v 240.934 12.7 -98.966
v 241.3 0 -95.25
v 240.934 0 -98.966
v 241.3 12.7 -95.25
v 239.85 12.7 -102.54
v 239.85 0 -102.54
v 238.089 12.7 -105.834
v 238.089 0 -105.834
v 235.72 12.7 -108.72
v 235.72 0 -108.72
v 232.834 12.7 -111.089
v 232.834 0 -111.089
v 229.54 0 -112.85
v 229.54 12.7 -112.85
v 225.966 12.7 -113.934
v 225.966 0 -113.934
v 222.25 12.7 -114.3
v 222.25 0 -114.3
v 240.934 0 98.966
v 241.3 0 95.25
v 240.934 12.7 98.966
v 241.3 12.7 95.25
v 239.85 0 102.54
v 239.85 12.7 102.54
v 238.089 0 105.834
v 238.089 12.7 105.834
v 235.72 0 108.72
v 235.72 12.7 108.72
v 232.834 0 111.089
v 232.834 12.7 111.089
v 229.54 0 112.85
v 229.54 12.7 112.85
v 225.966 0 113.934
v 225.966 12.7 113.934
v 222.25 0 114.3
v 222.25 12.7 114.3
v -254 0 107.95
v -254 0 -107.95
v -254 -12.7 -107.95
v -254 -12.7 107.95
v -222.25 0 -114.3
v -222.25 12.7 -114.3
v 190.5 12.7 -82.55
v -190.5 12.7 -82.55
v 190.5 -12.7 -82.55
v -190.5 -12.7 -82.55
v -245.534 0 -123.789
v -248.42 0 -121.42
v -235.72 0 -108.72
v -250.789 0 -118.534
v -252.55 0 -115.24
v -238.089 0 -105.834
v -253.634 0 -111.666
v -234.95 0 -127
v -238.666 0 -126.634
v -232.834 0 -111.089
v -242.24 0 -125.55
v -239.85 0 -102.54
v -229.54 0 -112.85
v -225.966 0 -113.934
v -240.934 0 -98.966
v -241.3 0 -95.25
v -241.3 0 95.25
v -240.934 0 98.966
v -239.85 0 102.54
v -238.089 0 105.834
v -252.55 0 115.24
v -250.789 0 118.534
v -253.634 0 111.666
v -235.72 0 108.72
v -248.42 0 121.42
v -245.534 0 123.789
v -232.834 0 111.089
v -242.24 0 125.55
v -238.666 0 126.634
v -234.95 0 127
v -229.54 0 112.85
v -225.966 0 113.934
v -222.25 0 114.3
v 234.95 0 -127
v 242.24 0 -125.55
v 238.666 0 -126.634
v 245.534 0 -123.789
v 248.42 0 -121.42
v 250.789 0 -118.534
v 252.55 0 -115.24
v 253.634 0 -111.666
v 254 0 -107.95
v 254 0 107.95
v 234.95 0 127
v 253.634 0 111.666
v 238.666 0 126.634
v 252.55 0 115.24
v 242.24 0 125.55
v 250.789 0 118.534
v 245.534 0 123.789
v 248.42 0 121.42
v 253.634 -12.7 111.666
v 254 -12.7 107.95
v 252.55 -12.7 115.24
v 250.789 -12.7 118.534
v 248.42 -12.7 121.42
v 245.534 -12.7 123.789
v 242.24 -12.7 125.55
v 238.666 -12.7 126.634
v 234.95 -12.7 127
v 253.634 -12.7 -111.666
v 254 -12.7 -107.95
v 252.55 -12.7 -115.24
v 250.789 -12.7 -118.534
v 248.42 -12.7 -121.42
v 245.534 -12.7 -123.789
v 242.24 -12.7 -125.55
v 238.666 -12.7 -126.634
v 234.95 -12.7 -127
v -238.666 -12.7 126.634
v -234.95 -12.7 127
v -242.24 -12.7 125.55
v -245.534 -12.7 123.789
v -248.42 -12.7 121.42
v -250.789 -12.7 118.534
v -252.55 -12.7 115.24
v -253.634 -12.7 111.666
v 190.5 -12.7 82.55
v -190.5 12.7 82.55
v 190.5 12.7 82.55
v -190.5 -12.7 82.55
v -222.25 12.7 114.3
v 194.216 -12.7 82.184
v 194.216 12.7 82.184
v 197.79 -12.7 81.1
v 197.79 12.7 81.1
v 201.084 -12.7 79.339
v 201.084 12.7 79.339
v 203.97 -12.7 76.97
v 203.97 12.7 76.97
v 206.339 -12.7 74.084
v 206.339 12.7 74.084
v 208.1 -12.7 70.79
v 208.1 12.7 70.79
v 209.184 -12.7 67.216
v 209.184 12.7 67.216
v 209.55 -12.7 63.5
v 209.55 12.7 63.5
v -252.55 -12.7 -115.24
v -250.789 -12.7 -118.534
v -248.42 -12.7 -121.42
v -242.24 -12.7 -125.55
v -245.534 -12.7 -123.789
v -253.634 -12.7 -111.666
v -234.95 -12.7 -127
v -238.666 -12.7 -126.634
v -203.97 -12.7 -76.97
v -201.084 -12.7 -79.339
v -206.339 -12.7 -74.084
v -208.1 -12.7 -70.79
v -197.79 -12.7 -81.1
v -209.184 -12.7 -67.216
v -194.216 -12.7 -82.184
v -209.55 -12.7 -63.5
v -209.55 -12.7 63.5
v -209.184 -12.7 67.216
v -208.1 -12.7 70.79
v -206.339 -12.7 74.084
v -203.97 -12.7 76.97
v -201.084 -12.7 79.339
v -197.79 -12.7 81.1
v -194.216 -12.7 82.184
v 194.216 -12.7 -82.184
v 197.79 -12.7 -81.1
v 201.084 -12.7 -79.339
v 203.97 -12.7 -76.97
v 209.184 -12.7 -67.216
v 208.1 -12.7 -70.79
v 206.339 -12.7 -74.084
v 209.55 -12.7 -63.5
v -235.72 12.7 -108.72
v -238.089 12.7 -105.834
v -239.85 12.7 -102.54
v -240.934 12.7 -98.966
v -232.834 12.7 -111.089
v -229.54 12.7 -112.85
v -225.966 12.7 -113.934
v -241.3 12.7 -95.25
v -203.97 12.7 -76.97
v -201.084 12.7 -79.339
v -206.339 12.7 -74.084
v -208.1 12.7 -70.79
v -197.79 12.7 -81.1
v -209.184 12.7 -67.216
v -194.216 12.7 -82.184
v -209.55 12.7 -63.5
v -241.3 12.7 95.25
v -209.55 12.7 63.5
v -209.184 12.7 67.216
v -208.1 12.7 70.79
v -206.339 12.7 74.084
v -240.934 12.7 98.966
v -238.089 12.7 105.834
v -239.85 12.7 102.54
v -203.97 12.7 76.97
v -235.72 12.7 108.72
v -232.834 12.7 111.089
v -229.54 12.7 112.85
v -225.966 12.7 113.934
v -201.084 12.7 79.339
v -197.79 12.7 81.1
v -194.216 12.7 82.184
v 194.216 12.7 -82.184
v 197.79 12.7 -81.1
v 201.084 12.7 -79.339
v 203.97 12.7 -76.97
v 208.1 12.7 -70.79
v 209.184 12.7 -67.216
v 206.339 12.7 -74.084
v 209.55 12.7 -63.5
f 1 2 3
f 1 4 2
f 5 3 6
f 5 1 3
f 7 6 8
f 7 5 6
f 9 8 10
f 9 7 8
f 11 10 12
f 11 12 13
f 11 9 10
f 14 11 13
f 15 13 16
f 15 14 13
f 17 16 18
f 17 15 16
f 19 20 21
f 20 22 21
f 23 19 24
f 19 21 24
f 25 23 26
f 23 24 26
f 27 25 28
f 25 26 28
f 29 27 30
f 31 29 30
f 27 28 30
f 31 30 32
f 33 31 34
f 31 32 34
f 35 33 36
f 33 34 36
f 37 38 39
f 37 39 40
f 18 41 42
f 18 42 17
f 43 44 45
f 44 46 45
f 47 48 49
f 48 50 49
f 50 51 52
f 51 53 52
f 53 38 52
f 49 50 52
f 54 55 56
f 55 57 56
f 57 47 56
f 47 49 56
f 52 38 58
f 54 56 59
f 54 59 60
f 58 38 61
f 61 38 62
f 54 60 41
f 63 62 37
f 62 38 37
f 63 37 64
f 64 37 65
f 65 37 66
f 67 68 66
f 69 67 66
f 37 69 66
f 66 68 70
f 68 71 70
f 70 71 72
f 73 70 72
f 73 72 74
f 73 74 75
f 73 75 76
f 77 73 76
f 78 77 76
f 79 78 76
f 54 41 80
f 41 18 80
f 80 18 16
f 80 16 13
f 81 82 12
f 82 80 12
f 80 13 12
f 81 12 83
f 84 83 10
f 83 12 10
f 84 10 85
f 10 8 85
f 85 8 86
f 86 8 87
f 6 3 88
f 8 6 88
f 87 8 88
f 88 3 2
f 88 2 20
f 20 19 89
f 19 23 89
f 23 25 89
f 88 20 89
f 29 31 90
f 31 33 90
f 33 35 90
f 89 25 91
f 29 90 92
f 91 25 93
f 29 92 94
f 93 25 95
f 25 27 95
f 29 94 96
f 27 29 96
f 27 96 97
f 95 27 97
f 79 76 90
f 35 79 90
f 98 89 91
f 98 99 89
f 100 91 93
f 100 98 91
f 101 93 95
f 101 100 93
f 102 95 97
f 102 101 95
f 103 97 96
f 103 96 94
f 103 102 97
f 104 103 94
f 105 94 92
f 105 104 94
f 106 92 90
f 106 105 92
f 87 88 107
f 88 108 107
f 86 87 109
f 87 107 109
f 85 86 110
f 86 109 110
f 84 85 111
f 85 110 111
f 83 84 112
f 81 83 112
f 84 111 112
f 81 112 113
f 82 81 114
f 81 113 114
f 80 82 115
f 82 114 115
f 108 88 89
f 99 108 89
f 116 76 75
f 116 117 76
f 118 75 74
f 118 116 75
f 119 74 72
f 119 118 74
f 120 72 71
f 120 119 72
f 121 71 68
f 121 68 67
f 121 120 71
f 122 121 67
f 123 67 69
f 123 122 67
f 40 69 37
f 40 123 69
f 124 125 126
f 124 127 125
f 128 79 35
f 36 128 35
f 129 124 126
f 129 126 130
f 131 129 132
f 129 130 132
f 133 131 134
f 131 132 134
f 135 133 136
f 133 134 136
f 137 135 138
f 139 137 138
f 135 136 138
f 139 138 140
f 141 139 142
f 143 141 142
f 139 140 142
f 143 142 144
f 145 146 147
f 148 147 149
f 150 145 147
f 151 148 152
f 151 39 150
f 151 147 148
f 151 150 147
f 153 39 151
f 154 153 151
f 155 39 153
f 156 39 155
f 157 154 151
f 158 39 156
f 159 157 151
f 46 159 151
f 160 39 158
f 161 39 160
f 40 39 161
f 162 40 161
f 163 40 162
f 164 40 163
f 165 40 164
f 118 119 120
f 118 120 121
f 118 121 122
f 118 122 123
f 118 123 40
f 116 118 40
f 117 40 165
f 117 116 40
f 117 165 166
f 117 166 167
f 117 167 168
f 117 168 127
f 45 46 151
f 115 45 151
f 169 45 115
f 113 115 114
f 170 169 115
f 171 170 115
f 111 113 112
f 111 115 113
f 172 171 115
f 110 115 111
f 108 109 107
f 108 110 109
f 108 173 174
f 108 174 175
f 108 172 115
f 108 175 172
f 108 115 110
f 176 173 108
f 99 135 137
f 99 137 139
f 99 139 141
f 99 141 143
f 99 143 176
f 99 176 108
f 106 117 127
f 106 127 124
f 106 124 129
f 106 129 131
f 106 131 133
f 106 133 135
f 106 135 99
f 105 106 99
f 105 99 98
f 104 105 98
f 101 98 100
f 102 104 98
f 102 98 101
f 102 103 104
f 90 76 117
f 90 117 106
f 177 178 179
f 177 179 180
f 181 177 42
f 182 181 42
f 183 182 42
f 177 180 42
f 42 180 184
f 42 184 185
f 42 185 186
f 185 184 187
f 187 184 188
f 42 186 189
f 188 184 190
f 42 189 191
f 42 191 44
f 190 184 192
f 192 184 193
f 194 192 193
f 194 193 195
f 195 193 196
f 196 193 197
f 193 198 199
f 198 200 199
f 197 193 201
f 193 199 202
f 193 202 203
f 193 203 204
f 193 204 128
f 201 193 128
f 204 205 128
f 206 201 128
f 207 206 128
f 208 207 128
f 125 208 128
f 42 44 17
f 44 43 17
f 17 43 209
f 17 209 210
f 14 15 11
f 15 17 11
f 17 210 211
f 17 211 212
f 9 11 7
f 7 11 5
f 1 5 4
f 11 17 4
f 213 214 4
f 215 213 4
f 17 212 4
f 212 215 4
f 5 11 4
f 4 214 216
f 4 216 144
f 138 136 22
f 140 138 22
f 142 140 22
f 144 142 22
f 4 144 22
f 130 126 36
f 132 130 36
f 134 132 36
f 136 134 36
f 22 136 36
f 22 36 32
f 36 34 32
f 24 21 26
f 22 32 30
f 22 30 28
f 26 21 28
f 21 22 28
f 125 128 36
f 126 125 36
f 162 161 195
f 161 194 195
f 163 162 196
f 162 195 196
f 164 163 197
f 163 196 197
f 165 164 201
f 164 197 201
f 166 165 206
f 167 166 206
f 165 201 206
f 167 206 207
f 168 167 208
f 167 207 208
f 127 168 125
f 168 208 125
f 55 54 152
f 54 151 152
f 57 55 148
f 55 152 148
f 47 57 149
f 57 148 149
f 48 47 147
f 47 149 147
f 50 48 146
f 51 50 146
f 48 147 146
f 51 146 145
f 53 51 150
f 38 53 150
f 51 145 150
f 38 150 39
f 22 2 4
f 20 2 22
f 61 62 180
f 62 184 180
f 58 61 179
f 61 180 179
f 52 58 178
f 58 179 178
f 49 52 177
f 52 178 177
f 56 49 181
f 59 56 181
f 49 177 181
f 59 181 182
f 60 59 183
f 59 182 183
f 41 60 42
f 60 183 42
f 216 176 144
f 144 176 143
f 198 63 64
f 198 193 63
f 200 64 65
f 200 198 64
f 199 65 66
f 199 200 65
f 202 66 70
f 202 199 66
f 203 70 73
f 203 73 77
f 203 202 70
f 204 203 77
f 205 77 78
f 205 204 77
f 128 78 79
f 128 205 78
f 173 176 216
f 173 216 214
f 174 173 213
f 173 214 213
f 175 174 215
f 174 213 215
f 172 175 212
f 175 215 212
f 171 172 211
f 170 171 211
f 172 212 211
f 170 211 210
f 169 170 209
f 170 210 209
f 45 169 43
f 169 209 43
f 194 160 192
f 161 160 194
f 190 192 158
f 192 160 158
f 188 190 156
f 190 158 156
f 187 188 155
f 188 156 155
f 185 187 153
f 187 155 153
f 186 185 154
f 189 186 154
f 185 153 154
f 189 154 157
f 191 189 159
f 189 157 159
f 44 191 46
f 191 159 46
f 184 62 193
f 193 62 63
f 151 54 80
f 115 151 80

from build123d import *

# Parameters (mm, degrees)
F0_W     = 508
F0_H     = 254
F0_W_2   = 419.1
F0_H_2   = 165.1
F1_DEPTH = 12.7
F2_W     = 482.6
F2_H     = 228.6
F2_W_2   = 419.1
F2_H_2   = 165.1
F3_DEPTH = 12.7
F4_R     = 19.05


with BuildPart() as f1:
    # F0 (on Front) → F1 (new body)
    with BuildSketch(Plane.XZ):
        Rectangle(F0_W, F0_H)
        Rectangle(F0_W_2, F0_H_2, mode=Mode.SUBTRACT)
    extrude(amount=F1_DEPTH)

    # F2 (on Front) → F3 (join)
    with BuildSketch(Plane.XZ):
        Rectangle(F2_W, F2_H)
        Rectangle(F2_W_2, F2_H_2, mode=Mode.SUBTRACT)
    extrude(amount=-F3_DEPTH)

    # F4
    f4_edges = [f1.edges().sort_by_distance(p)[0] for p in [
        (254, -6.35, 127),
        (241.3, 6.35, 114.3),
        (209.55, 0, 82.55),
        (254, -6.35, -127),
        (241.3, 6.35, -114.3),
        (209.55, 0, -82.55),
        (-209.55, 0, -82.55),
        (-241.3, 6.35, -114.3),
        (-254, -6.35, -127),
        (-254, -6.35, 127),
        (-241.3, 6.35, 114.3),
        (-209.55, 0, 82.55),
    ]]
    fillet(f4_edges, radius=F4_R)


solid = f1.part
